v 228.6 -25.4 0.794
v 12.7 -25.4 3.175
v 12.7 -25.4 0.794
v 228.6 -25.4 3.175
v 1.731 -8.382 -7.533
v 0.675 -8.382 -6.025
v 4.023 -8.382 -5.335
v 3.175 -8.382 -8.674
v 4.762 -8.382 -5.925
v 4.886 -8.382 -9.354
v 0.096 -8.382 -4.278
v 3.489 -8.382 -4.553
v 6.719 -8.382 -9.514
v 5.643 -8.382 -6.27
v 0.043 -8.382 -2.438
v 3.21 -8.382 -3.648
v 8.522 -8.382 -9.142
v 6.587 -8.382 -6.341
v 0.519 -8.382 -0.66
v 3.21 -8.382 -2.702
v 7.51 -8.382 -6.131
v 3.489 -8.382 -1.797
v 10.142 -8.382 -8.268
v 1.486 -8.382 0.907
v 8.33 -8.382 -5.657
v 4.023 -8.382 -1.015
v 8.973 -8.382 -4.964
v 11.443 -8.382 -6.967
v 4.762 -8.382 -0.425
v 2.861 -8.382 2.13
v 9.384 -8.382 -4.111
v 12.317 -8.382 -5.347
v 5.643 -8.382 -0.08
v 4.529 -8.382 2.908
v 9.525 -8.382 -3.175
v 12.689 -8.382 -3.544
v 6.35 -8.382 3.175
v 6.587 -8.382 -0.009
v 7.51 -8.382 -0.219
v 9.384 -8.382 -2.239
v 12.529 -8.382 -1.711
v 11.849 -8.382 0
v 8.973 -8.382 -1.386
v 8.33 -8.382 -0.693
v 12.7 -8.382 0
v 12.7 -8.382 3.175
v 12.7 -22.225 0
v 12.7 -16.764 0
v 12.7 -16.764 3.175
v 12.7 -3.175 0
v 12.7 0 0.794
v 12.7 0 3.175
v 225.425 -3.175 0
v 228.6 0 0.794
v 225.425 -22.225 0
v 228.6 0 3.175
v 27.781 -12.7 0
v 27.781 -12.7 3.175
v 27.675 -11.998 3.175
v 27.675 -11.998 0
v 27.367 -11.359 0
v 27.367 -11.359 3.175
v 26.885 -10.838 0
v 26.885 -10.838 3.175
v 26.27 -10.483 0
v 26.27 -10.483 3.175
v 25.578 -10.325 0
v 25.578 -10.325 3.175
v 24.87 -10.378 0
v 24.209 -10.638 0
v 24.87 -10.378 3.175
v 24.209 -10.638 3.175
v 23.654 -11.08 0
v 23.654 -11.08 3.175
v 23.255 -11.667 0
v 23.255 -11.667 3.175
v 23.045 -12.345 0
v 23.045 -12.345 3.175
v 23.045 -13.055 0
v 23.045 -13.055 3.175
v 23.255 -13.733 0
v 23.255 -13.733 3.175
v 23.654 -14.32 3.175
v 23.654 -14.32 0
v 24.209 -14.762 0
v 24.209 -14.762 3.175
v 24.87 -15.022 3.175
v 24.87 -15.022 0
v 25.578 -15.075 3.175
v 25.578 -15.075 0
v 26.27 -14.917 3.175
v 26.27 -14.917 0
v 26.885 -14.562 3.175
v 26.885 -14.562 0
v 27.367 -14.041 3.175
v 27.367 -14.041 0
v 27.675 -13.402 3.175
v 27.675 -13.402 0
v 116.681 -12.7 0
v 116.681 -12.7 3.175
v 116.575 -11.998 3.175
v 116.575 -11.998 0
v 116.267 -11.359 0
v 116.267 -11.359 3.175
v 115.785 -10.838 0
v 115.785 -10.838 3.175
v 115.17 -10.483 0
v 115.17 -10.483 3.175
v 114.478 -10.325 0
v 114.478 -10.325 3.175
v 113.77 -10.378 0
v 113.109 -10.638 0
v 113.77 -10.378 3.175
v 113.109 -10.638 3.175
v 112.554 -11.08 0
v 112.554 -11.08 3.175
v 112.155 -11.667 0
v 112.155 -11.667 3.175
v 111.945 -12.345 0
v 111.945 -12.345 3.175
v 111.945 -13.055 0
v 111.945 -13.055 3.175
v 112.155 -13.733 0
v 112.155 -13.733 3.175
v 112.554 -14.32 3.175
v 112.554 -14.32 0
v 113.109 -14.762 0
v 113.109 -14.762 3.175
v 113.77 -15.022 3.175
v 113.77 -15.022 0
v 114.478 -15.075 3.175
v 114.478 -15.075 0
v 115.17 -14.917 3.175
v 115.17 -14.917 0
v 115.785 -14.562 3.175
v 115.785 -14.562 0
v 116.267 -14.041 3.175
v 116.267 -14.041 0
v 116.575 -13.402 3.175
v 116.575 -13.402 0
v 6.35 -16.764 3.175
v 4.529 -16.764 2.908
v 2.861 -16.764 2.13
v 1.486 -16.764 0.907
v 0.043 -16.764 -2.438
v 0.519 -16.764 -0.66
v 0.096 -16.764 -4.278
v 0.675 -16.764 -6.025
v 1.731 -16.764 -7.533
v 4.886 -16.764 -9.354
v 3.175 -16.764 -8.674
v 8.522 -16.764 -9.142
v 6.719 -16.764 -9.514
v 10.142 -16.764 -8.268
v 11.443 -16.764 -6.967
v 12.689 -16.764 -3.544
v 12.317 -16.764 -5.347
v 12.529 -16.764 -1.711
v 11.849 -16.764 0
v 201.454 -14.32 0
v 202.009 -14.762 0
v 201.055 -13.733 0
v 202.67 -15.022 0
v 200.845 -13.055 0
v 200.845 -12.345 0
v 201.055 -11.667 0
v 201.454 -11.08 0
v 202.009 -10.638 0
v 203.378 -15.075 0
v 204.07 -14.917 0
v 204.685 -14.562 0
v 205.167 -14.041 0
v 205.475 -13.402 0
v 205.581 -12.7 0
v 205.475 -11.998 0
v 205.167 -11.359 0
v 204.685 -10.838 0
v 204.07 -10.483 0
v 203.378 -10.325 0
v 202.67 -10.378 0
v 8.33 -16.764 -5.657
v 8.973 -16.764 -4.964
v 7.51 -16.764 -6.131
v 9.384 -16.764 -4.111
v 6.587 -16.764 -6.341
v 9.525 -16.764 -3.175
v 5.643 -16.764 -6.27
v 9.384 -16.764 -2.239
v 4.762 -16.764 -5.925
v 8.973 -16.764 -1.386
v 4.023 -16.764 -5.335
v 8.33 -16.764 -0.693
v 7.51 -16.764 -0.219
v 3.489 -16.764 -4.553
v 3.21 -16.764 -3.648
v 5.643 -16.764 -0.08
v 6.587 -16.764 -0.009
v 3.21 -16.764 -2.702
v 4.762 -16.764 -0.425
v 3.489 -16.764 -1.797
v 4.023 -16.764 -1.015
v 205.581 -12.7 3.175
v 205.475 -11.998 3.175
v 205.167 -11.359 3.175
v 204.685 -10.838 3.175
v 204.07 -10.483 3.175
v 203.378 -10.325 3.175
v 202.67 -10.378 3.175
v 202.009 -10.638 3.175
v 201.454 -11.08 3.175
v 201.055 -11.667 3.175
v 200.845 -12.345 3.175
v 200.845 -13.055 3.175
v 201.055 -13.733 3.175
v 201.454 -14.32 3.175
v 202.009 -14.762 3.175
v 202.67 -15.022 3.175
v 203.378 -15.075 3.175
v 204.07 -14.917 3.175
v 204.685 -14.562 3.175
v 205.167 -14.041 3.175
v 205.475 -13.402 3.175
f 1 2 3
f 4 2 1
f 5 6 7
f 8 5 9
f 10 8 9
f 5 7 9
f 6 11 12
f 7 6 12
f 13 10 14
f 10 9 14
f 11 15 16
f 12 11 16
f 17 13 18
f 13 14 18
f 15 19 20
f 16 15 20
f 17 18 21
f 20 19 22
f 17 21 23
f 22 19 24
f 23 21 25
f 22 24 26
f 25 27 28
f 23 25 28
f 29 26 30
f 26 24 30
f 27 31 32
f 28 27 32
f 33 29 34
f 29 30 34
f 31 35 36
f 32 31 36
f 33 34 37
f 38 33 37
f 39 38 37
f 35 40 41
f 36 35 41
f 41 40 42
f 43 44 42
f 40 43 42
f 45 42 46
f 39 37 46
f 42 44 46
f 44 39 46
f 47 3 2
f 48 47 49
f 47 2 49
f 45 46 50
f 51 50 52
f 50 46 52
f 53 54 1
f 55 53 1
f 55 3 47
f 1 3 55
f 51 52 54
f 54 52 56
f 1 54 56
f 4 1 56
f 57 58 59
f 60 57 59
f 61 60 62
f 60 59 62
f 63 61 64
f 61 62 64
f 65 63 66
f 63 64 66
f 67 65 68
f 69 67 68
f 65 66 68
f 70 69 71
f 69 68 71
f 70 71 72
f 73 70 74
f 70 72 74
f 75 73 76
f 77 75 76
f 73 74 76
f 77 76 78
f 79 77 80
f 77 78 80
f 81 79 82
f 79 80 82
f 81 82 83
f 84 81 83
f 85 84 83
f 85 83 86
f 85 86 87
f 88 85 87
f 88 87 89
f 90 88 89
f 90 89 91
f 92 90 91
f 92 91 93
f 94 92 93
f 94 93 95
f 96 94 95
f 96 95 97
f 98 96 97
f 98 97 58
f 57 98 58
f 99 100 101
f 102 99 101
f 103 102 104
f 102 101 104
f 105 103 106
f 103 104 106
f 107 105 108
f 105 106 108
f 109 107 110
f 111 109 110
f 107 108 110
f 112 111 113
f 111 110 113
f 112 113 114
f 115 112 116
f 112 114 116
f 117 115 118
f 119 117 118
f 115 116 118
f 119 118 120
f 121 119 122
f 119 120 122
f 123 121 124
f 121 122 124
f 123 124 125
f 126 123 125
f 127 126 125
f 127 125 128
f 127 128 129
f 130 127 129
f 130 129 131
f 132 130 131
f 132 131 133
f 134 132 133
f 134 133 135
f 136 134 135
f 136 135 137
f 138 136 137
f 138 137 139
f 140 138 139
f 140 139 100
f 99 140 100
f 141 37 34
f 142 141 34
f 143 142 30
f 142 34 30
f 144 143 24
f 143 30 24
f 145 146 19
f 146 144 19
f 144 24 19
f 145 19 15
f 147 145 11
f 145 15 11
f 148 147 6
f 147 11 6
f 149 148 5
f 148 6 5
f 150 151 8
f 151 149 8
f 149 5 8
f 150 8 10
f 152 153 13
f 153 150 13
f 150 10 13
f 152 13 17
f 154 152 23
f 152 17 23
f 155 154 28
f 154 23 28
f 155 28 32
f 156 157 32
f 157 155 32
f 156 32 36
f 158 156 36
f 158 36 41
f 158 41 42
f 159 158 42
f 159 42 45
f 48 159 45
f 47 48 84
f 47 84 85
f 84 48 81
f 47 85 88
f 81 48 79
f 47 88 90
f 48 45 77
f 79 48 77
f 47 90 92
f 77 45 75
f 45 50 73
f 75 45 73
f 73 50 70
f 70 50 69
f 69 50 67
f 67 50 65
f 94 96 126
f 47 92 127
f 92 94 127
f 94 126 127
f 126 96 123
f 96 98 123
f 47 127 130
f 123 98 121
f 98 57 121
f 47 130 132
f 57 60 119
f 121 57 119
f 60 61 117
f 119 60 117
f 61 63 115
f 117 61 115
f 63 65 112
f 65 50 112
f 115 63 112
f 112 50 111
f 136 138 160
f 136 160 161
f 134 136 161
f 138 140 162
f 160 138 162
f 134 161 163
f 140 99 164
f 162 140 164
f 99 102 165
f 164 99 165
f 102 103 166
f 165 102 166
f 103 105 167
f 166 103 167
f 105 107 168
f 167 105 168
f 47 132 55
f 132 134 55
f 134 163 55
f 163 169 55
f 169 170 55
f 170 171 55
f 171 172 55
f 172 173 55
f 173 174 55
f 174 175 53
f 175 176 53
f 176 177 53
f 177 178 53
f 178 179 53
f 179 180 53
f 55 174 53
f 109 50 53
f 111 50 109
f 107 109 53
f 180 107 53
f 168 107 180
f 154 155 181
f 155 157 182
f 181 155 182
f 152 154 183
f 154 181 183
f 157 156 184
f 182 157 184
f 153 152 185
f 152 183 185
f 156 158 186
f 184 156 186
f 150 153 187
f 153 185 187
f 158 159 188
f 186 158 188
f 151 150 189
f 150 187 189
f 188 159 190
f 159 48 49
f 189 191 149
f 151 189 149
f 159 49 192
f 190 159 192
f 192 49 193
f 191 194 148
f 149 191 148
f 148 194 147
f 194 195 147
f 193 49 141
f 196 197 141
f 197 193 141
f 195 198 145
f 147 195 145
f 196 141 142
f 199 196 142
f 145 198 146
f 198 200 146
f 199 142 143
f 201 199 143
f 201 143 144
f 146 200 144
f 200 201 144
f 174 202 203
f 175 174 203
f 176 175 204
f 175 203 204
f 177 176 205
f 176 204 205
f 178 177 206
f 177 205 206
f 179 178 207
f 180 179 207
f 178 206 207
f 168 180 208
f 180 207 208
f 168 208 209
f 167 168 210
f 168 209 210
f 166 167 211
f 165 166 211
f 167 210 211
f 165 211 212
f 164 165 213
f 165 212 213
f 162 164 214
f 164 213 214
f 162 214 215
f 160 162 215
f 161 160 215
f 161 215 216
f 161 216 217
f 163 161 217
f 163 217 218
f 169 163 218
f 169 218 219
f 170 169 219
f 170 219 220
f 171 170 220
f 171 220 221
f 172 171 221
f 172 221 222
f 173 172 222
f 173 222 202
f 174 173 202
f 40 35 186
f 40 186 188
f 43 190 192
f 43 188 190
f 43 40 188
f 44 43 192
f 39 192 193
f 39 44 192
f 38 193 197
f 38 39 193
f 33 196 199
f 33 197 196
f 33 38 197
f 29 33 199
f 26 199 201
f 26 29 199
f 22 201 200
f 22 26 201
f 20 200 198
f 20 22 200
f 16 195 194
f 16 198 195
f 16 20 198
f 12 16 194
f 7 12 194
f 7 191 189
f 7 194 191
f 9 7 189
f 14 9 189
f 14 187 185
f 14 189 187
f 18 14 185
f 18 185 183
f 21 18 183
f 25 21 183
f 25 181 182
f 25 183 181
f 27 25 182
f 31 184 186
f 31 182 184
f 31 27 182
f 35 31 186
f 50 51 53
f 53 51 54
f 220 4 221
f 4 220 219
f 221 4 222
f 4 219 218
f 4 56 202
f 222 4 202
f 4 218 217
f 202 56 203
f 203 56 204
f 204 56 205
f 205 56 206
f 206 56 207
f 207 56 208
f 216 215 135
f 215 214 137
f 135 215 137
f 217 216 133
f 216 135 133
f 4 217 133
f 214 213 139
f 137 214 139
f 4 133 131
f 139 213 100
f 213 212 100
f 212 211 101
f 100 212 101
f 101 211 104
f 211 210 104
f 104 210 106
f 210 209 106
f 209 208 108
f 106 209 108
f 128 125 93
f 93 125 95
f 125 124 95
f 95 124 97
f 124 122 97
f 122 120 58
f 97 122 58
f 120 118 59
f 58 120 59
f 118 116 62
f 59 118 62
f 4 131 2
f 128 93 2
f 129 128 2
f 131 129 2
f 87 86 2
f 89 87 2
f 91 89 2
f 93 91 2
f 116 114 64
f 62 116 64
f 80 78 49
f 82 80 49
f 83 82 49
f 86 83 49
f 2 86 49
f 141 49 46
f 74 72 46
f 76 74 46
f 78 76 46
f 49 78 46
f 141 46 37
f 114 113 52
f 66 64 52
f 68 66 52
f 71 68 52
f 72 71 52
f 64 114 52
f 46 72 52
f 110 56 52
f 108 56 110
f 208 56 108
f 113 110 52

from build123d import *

# Parameters (mm, degrees)
F0_R     = 3.175
F1_DEPTH = 25.4
F2_R     = 2.38125
F3_DEPTH = 12.701
F4_SIZE2 = 0.79375
F4_SIZE  = 3.175


with BuildPart() as f1:
    # F0 (on Front) → F1 (new body)
    with BuildSketch(Plane.XZ):
        with BuildLine():
            ThreePointArc((6.35, 3.175), (3.175, -8.674261314), (11.849261314, 0))
            Line((11.849261314, 0), (228.6, 0))
            Line((228.6, 0), (228.6, 3.175))
            Line((228.6, 3.175), (6.35, 3.175))
        make_face()
        with Locations((6.35, -3.175)):
            Circle(F0_R, mode=Mode.SUBTRACT)
    extrude(amount=F1_DEPTH)

    # F2 (on face) → F3 (cut, through all)
    with BuildSketch(Plane.XY.offset(3.175)):
        with Locations((203.2, -12.7)):
            Circle(F2_R)
        with Locations((114.3, -12.7)):
            Circle(F2_R)
        with Locations((25.4, -12.7)):
            Circle(F2_R)
        Polygon((12.7, -8.382), (12.7, 5.4248190135), (-5.8604556464, 5.4248190135), (-5.8604556464, -32.8125189408), (12.7, -32.8125189408), (12.7, -16.764), (0, -16.764), (0, -8.382), align=None)
    extrude(amount=-F3_DEPTH, mode=Mode.SUBTRACT)

    # F4
    f4_edges = [f1.edges().sort_by_distance(p)[0] for p in [
        (120.65, -25.4, 0),
        (120.65, 0, 0),
        (228.6, -12.7, 0),
    ]]
    f4_side = f1.faces().sort_by_distance((120.570284, -12.699833, 0))[0]
    chamfer(f4_edges, length=F4_SIZE, length2=F4_SIZE2, reference=f4_side)


solid = f1.part
